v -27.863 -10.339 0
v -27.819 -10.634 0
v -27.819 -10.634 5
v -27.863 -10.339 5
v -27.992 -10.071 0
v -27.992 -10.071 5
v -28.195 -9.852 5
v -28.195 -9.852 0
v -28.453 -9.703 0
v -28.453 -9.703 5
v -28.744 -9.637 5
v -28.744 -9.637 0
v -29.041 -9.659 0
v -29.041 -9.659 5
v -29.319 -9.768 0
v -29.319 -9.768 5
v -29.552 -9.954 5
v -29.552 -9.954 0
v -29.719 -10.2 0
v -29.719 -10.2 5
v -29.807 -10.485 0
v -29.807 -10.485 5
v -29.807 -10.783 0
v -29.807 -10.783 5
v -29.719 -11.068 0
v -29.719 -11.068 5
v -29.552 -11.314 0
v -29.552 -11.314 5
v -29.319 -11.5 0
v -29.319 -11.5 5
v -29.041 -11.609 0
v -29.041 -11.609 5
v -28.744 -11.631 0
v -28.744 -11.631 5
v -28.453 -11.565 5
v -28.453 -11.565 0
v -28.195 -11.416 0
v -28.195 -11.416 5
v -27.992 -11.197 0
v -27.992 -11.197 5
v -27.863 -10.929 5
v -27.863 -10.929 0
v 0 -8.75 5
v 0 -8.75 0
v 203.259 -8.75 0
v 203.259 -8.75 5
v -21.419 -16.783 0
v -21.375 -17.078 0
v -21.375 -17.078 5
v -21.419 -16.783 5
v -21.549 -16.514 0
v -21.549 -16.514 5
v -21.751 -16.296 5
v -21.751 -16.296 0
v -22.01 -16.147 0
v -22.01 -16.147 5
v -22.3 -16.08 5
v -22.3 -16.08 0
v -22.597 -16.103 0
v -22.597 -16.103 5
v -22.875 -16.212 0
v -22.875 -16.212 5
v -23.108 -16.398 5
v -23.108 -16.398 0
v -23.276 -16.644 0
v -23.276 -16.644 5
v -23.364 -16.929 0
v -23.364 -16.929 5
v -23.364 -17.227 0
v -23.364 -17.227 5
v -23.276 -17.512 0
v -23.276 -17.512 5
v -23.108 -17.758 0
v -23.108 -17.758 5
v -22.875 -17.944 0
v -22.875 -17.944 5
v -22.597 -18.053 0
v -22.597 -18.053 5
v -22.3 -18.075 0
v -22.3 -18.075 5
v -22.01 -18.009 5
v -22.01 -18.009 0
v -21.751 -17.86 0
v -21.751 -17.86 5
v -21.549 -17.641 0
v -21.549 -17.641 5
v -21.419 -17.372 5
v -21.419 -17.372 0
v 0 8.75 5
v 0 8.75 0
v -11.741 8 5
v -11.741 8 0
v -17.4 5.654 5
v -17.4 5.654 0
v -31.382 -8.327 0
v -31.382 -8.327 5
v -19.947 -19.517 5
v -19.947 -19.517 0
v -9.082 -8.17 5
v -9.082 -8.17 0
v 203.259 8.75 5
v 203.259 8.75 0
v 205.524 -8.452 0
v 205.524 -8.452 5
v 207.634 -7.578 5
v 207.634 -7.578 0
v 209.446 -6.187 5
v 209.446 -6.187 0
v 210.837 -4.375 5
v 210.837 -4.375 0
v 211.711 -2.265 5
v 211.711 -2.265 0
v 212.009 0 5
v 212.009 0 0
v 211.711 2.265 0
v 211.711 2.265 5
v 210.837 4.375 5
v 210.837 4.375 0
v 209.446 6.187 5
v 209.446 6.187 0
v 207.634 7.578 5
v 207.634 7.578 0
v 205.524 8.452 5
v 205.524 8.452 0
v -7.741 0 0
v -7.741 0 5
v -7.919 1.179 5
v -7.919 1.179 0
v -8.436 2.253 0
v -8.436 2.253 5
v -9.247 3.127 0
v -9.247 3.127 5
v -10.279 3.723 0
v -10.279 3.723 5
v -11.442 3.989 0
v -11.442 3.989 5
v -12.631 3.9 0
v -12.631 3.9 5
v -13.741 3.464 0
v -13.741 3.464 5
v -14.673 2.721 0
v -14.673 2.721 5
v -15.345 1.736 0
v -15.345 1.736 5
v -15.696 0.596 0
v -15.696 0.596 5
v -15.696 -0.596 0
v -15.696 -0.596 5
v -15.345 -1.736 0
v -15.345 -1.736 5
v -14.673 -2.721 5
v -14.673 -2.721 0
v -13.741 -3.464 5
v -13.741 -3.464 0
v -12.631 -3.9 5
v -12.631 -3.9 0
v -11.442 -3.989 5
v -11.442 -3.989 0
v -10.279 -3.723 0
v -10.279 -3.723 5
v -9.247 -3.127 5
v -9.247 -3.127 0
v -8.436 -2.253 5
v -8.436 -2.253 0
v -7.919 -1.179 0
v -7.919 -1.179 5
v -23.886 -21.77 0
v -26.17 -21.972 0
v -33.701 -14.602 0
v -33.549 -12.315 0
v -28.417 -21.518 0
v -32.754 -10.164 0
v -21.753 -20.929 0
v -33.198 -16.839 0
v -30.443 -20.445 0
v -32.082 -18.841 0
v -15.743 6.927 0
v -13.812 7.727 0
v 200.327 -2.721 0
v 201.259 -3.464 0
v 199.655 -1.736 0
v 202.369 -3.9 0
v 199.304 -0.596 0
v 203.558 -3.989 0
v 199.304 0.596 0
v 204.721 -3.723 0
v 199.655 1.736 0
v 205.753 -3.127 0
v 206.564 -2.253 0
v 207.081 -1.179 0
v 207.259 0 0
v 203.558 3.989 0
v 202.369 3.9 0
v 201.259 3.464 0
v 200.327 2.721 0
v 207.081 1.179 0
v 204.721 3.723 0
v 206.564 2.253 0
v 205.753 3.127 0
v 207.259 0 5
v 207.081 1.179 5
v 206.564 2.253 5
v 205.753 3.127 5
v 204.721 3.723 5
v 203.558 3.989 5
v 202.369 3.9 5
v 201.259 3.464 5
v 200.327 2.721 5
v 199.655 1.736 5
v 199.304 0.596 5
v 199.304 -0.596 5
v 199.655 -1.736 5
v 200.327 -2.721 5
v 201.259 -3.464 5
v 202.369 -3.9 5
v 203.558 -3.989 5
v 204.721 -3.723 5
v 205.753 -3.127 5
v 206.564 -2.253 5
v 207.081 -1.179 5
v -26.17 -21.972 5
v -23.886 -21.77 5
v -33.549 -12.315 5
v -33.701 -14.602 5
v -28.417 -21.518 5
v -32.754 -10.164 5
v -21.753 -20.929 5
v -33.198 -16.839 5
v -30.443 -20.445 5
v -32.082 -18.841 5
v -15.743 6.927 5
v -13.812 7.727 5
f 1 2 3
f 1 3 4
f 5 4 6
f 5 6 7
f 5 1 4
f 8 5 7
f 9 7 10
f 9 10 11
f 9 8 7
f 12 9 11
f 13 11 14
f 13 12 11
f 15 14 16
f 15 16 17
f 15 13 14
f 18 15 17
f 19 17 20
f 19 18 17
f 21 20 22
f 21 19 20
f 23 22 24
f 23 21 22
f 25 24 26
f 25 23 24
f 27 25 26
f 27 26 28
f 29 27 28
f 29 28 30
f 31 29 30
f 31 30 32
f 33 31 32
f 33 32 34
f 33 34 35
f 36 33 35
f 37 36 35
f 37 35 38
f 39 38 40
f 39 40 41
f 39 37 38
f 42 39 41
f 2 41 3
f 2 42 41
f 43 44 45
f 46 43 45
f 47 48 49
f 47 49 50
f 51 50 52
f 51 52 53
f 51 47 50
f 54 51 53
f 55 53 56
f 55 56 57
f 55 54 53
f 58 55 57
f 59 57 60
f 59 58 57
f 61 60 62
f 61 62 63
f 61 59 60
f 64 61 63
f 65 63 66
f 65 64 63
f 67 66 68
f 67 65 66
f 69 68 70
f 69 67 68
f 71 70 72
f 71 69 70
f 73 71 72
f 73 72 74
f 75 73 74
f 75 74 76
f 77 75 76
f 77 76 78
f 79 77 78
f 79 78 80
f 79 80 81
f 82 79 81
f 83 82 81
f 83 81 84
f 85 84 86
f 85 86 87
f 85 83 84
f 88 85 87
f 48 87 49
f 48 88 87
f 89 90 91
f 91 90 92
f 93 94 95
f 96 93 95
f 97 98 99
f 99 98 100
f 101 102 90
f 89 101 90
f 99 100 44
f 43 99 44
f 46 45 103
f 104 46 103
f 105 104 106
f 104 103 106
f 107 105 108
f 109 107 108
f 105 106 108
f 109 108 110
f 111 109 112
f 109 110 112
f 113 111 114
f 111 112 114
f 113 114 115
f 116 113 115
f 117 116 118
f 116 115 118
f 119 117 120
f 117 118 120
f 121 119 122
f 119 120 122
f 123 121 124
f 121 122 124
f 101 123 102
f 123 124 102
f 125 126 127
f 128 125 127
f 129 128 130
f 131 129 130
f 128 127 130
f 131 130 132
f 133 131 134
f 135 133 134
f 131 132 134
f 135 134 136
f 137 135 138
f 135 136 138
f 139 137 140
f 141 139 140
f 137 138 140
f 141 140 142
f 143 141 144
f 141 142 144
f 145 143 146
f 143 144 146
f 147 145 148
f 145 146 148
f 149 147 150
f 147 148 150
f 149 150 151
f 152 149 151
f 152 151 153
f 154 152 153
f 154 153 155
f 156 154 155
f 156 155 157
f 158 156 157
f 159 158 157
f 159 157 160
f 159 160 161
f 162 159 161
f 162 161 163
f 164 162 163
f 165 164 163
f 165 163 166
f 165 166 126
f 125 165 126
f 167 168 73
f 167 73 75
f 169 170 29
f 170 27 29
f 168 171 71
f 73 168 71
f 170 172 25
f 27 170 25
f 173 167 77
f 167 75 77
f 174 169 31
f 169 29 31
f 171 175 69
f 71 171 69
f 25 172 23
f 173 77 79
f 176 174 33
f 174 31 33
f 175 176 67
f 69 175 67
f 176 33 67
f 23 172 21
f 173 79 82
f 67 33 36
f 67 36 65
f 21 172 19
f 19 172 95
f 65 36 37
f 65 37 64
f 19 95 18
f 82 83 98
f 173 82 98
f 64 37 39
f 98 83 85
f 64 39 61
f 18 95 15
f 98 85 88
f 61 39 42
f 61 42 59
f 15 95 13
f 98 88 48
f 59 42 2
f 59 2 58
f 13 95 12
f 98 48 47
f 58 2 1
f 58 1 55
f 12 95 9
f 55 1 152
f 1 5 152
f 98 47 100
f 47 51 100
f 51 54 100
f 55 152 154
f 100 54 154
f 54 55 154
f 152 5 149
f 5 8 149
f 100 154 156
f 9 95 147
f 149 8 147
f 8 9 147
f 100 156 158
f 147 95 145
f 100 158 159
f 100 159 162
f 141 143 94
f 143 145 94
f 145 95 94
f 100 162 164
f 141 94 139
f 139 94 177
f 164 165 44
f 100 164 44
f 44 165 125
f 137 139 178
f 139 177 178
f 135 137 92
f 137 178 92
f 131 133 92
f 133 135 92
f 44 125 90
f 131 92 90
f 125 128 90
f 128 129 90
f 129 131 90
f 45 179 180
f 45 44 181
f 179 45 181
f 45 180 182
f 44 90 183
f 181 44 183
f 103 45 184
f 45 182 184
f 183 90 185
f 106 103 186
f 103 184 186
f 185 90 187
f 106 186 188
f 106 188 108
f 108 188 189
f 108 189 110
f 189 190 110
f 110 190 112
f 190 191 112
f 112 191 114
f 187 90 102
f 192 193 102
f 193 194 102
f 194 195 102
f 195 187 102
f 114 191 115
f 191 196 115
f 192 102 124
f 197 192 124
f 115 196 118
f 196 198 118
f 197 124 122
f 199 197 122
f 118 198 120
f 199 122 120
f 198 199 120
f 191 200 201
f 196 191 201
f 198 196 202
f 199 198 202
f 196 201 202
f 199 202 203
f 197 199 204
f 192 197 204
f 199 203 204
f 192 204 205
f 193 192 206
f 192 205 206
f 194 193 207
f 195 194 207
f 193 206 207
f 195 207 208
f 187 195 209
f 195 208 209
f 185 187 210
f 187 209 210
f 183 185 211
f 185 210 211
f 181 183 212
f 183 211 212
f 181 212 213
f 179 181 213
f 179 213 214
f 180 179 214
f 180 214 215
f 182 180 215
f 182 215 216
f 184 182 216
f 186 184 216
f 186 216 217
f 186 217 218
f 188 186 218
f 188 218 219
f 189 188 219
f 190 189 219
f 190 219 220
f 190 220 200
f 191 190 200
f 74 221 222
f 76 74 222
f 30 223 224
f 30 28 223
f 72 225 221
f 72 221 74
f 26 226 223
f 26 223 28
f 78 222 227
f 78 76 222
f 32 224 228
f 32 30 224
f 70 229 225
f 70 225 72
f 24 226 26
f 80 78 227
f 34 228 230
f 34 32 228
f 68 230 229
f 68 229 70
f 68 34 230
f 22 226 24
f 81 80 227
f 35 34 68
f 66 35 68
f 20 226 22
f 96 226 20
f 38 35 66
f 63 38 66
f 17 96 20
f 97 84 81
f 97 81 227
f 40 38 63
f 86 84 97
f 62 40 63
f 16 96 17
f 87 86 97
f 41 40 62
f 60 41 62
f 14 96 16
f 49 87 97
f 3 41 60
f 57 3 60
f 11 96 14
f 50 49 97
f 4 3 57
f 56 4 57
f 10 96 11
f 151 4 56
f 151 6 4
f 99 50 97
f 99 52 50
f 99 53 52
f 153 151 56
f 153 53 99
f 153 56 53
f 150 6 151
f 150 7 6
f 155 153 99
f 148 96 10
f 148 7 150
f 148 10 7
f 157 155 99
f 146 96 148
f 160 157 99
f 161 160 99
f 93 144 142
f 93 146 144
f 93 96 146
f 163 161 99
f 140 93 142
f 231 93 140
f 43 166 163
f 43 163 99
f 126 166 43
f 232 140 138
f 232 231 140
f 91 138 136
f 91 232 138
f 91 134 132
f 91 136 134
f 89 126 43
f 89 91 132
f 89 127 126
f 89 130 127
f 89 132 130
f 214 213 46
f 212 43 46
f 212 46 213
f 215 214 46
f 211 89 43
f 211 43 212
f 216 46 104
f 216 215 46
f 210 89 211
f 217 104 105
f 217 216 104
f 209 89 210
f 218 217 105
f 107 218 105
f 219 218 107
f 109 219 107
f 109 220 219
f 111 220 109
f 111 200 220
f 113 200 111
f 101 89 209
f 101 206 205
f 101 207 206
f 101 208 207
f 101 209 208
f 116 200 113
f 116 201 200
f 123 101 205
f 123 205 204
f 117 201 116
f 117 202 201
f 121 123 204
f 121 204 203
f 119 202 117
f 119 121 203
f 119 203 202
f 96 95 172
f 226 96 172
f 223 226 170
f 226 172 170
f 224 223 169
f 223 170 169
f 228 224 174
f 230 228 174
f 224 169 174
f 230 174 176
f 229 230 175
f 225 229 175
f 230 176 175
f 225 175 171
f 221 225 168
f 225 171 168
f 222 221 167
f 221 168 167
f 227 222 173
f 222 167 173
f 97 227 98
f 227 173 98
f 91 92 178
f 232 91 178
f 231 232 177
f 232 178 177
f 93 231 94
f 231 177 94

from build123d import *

# Parameters (mm, degrees)
SKETCH_3_R          = 8
EXTRUDE_1_DEPTH     = 5
SKETCH_4_R          = 4
CUT_EXTRUDE_1_DEPTH = 213.248558243
SKETCH_5_R          = 1
EXTRUDE_3_DEPTH     = 5


with BuildPart() as part:
    # 草图3 → 凸台-拉伸1 (new body)
    with BuildSketch(Plane.XY):
        with BuildLine():
            ThreePointArc((203.259167971, -8.750002099), (194.509167971, -2.099e-06), (203.259167971, 8.749997901))
            Line((203.259167971, 8.749997901), (0, 8.749997901))
            Line((0, 8.749997901), (-11.740832029, 8))
            ThreePointArc((-11.740832029, 8), (-6.08397778, 5.656854249), (-3.740832029, 0))
            ThreePointArc((-3.740832029, 0), (-6.08397778, -5.656854249), (-11.740832029, -8))
            Line((-11.740832029, -8), (0, -8.750038444))
            Line((0, -8.750038444), (203.259167971, -8.750002099))
        make_face()
        with Locations((-11.740832029, 0)):
            Circle(SKETCH_3_R)
        with BuildLine():
            ThreePointArc((212.009167971, -2.099e-06), (209.446352306, 6.187182236), (203.259167971, 8.749997901))
            Line((203.259167971, 8.749997901), (203.259167971, -8.750002099))
            ThreePointArc((203.259167971, -8.750002099), (209.446352306, -6.187186435), (212.009167971, -2.099e-06))
        make_face()
        with BuildLine():
            Line((203.259167971, -8.750002099), (203.259167971, 8.749997901))
            ThreePointArc((203.259167971, 8.749997901), (194.509167971, -2.099e-06), (203.259167971, -8.750002099))
        make_face()
    extrude(amount=EXTRUDE_1_DEPTH)

    # 草图4 → 切除-拉伸1 (cut, through all)
    with BuildSketch(Plane.XY.offset(5)):
        with Locations((-11.740832029, 0)):
            Circle(SKETCH_4_R)
        with Locations((203.259167971, -2.099e-06)):
            Circle(SKETCH_4_R)
    extrude(amount=-CUT_EXTRUDE_1_DEPTH, mode=Mode.SUBTRACT)

    # 草图5 → 凸台-拉伸3 (add)
    with BuildSketch(Plane.XY):
        with BuildLine():
            ThreePointArc((-11.740832029, -8), (-19.131223835, -3.063022848), (-17.400066767, 5.654472759))
            Line((-17.400066767, 5.654472759), (-31.381865156, -8.327324627))
            ThreePointArc((-31.381865156, -8.327324627), (-31.320161123, -19.702071726), (-19.94675289, -19.516966077))
            Line((-19.94675289, -19.516966077), (-9.081705309, -8.169872737))
            Line((-9.081705309, -8.169872737), (-11.740832029, -8))
        make_face()
        with Locations((-28.81851625, -10.634029839)):
            Circle(SKETCH_5_R, mode=Mode.SUBTRACT)
        with Locations((-22.374861868, -17.077684221)):
            Circle(SKETCH_5_R, mode=Mode.SUBTRACT)
    extrude(amount=EXTRUDE_3_DEPTH)


solid = part.part
